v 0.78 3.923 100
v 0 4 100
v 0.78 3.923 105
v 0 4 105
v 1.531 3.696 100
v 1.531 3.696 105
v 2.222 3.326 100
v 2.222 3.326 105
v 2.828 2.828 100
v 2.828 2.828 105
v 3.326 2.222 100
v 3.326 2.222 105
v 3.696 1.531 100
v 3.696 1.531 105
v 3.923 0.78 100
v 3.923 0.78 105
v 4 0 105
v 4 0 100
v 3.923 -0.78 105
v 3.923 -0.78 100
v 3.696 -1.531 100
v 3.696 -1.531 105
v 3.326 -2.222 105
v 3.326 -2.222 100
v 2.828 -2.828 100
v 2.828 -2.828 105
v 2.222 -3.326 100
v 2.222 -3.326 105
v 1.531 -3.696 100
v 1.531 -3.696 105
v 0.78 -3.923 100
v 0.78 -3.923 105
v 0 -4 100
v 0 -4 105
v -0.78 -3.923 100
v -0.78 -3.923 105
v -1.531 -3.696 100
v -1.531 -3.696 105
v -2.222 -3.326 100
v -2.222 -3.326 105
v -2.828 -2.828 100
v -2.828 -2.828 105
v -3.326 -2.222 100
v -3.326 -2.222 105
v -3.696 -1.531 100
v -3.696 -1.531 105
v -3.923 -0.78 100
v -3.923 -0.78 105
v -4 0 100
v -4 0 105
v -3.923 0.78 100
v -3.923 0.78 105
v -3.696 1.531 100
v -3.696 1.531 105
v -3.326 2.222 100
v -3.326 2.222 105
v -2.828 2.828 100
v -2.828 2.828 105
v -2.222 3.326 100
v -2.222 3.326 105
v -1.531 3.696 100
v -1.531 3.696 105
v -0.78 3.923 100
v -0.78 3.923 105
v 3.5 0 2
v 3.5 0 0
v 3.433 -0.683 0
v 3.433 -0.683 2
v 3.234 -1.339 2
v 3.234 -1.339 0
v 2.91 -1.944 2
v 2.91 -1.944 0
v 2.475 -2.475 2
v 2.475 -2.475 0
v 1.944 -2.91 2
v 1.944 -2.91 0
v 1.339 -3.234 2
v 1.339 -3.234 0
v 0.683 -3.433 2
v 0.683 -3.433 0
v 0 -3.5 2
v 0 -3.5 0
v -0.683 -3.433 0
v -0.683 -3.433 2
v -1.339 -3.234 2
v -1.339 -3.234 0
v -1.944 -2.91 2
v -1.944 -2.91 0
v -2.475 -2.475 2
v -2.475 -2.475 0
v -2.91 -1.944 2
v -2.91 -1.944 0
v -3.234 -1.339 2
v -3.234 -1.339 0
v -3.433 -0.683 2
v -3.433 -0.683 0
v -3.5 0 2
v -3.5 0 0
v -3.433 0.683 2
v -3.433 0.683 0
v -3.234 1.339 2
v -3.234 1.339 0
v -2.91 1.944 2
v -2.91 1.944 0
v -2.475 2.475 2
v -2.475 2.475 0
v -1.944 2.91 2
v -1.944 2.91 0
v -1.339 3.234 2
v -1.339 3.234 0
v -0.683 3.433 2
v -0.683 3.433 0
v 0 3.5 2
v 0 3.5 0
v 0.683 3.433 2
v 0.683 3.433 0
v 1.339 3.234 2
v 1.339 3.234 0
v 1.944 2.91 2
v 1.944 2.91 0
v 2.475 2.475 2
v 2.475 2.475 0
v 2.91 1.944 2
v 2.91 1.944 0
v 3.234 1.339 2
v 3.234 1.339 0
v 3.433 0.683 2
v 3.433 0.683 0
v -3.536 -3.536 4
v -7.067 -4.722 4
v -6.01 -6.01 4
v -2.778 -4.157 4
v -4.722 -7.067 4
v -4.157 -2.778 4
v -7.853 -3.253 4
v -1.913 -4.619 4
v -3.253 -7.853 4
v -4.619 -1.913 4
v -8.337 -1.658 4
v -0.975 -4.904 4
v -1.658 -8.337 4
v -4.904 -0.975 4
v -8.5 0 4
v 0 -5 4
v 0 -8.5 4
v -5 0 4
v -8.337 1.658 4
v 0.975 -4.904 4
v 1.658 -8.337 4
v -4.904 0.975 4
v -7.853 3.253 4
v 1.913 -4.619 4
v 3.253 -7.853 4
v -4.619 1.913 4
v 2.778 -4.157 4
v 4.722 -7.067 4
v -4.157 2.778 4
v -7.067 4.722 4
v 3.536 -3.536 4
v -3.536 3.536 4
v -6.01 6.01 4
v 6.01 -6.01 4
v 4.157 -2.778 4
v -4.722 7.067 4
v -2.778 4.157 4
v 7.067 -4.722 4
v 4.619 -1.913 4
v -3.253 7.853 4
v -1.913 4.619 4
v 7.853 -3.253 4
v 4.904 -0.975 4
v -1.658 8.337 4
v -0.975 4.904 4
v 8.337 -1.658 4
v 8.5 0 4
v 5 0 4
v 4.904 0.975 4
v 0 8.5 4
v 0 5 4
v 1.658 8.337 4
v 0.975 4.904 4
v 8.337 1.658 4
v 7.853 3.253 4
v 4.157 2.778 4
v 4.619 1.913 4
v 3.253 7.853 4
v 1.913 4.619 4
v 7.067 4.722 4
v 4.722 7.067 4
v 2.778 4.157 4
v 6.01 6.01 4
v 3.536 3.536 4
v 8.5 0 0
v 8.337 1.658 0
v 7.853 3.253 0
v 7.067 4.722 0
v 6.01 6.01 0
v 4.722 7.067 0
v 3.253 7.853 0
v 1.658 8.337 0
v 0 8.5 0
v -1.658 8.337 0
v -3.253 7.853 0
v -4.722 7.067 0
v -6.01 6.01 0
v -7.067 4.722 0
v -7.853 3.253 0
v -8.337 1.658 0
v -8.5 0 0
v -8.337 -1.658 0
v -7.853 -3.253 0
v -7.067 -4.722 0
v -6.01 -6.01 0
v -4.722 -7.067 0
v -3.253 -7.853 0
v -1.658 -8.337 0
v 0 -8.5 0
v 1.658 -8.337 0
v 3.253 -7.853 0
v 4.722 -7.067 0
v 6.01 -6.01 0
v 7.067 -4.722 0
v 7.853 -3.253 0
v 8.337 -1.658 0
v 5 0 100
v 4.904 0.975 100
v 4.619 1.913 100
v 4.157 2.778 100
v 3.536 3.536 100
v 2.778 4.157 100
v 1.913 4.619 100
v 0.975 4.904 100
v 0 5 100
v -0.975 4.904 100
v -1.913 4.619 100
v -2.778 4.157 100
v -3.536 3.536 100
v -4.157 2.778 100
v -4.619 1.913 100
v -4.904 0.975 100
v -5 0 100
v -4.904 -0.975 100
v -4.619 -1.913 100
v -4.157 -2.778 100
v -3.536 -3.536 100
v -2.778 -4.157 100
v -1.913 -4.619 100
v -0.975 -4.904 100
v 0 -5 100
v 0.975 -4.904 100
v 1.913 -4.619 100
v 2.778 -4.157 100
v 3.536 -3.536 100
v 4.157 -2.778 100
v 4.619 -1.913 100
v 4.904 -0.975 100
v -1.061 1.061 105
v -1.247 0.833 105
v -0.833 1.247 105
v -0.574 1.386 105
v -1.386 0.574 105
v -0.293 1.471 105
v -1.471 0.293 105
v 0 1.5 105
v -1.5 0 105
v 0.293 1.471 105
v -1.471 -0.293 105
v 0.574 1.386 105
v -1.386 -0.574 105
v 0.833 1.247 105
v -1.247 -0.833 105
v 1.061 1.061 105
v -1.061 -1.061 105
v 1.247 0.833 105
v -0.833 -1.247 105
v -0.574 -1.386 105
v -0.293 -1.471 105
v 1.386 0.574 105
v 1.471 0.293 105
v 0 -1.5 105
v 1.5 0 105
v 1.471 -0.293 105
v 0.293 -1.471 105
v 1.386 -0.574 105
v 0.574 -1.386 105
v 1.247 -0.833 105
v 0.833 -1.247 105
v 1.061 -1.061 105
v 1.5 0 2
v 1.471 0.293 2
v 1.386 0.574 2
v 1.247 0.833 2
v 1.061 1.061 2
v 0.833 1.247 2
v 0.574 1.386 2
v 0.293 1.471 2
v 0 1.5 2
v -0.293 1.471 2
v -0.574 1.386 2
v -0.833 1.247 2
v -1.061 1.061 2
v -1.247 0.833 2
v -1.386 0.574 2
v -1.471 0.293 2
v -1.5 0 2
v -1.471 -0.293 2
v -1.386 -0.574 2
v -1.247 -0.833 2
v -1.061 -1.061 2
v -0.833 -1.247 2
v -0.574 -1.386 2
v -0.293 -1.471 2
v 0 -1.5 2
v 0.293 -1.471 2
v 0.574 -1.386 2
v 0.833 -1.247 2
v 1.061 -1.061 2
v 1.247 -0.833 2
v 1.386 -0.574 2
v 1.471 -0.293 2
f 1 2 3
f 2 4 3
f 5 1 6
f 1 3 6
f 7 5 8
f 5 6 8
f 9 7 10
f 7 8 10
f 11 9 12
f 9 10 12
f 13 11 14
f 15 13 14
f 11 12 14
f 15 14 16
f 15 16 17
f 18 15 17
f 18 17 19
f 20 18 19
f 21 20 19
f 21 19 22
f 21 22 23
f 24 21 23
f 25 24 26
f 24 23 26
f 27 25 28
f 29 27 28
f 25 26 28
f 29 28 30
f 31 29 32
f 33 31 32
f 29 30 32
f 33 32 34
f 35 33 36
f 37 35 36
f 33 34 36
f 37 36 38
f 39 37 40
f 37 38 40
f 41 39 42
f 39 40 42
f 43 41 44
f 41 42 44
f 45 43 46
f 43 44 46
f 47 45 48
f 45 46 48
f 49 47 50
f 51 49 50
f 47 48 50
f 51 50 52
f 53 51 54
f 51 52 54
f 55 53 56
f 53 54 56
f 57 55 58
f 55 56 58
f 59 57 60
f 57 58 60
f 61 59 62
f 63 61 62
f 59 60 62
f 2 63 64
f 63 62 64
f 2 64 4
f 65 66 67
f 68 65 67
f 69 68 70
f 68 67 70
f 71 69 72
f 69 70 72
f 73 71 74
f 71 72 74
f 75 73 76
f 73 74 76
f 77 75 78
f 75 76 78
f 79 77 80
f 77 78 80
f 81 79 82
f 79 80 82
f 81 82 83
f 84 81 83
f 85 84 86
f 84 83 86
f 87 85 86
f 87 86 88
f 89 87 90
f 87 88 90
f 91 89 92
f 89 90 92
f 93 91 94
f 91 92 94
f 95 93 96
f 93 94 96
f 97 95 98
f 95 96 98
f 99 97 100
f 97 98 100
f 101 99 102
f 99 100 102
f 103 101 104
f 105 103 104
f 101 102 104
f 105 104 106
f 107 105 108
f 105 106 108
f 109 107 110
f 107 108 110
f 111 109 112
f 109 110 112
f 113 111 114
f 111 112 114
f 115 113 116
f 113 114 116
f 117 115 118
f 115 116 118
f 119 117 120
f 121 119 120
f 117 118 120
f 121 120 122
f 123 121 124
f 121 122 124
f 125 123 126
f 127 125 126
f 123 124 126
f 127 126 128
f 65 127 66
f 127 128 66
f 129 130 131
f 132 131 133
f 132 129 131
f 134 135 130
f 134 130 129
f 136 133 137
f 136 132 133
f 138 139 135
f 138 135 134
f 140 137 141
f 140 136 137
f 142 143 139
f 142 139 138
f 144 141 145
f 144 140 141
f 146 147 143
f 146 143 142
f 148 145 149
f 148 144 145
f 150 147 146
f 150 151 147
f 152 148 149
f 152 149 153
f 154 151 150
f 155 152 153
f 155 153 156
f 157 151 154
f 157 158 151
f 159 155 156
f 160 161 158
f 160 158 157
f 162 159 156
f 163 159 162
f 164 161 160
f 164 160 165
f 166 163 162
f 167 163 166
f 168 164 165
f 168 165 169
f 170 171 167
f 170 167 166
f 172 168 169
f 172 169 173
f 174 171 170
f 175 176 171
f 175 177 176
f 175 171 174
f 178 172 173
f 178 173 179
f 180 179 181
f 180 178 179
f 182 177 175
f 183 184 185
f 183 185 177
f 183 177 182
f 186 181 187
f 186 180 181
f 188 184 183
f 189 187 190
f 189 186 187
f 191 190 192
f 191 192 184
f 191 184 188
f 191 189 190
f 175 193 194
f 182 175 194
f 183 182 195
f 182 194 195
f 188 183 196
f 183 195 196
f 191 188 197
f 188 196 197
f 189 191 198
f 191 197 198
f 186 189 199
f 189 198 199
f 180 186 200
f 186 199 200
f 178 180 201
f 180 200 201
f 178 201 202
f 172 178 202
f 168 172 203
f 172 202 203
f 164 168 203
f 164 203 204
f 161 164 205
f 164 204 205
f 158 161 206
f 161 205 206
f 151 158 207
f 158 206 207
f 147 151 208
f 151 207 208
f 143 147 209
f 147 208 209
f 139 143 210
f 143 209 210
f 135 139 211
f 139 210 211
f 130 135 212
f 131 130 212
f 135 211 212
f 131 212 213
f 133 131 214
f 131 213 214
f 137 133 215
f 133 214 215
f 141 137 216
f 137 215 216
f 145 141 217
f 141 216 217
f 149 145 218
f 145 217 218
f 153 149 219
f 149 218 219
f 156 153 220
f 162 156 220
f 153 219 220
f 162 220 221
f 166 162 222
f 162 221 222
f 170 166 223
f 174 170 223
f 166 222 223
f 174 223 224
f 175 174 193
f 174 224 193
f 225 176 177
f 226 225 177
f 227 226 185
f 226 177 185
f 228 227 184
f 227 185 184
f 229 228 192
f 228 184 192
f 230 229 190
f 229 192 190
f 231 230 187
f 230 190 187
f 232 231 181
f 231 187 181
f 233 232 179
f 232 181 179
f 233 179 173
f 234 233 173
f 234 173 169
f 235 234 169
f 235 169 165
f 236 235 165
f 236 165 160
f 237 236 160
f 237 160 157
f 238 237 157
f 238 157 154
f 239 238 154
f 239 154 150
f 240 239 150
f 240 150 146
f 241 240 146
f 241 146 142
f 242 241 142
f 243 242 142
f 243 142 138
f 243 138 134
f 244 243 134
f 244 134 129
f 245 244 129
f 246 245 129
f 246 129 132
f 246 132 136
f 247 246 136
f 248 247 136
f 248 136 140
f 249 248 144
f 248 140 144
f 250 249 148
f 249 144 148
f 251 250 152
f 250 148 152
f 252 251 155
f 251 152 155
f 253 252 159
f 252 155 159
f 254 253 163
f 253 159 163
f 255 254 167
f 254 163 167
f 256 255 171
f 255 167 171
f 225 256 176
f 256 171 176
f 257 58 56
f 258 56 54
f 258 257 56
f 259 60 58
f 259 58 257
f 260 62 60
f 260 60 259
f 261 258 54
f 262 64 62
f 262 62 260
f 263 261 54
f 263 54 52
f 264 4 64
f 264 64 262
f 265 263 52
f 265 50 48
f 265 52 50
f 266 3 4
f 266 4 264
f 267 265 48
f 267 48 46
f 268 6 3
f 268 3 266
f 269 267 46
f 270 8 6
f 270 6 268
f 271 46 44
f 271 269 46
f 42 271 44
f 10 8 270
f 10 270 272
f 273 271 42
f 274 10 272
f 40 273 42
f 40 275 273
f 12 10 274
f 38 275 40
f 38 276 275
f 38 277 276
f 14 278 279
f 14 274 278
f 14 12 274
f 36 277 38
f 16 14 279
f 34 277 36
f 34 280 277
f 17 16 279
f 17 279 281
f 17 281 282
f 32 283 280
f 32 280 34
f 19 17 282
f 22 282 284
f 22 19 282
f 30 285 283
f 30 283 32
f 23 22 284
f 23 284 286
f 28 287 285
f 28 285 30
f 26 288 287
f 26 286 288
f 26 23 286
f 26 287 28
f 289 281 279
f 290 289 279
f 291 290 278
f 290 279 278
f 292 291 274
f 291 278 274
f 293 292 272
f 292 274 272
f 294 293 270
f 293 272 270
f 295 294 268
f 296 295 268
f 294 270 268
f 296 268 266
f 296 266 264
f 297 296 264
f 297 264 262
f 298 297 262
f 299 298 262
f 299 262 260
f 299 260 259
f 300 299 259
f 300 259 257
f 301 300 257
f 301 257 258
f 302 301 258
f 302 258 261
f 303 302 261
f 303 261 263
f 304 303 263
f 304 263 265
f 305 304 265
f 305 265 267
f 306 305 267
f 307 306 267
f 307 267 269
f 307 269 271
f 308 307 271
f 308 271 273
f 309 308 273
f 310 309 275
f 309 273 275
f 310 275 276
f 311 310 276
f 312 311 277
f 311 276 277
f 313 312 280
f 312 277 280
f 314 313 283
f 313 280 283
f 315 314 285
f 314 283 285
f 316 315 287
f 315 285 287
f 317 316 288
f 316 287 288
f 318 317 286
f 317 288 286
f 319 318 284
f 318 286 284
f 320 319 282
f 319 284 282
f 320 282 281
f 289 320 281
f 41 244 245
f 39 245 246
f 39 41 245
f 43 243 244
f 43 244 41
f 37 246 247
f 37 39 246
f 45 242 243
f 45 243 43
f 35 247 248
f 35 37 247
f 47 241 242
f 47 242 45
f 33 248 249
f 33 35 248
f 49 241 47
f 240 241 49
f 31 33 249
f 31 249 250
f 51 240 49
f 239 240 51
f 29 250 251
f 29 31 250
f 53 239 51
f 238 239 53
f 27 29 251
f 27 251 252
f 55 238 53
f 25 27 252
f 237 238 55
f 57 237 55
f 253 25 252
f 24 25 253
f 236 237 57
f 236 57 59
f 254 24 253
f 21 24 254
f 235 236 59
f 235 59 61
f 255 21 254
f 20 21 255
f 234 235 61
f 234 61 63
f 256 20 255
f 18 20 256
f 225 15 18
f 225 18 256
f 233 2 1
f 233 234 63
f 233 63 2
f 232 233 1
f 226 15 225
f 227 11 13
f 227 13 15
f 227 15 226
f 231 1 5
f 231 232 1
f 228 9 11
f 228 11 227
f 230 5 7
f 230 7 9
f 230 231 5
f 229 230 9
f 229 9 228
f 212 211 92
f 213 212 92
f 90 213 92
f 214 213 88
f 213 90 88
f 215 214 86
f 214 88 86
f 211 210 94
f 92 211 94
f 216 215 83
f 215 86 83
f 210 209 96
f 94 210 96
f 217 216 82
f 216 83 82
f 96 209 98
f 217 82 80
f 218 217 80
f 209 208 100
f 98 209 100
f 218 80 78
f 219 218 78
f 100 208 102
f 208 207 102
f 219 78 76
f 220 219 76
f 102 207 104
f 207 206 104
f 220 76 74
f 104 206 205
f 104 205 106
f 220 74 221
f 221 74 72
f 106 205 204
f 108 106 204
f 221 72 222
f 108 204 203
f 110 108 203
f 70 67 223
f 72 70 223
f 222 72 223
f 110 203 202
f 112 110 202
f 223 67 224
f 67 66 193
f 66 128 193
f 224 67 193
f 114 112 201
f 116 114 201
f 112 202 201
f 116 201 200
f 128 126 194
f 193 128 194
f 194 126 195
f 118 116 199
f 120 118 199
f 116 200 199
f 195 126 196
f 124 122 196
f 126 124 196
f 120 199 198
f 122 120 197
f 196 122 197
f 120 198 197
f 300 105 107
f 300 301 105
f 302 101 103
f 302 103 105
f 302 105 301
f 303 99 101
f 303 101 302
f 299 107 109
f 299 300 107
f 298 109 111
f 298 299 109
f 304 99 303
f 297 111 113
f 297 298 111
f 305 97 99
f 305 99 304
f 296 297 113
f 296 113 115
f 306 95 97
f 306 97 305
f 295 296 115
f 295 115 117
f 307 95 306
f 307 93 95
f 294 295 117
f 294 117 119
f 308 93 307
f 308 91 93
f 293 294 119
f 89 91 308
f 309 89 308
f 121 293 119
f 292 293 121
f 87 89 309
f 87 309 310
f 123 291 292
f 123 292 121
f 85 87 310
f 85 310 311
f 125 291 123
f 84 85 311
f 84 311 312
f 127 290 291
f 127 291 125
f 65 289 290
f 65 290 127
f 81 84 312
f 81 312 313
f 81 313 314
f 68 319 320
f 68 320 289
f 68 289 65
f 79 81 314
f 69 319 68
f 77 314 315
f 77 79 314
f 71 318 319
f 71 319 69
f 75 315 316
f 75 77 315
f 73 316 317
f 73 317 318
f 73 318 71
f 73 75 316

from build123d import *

# Parameters (mm, degrees)
F0_R     = 8.5
F1_DEPTH = 4
F2_R     = 5
F3_DEPTH = 100
F4_W     = 4
F4_H     = 5
F6_R     = 3.5
F7_DEPTH = 2
F8_R     = 1.5
F9_DEPTH = 118.6


with BuildPart() as f1:
    # F0 (on Top) → F1 (new body)
    with BuildSketch(Plane.XY):
        Circle(F0_R)
    extrude(amount=F1_DEPTH)

    # F2 (on Top) → F3 (join)
    with BuildSketch(Plane.XY):
        Circle(F2_R)
    extrude(amount=F3_DEPTH)

    # F4 (on Right) → F5 (revolve)
    with BuildSketch(Plane.YZ):
        with Locations((2, 102.5)):
            Rectangle(F4_W, F4_H)
    revolve(axis=Axis((0, 0, 102.5), (0, 0, -1)))

    # F6 (on face) → F7 (cut)
    with BuildSketch(Plane(origin=(0, 0, 0), x_dir=(1, 0, 0), z_dir=(0, 0, -1))):
        Circle(F6_R)
    extrude(amount=-F7_DEPTH, mode=Mode.SUBTRACT)

    # F8 (on face) → F9 (cut)
    with BuildSketch(Plane.XY.offset(105)):
        Circle(F8_R)
    extrude(amount=-F9_DEPTH, mode=Mode.SUBTRACT)


solid = f1.part
